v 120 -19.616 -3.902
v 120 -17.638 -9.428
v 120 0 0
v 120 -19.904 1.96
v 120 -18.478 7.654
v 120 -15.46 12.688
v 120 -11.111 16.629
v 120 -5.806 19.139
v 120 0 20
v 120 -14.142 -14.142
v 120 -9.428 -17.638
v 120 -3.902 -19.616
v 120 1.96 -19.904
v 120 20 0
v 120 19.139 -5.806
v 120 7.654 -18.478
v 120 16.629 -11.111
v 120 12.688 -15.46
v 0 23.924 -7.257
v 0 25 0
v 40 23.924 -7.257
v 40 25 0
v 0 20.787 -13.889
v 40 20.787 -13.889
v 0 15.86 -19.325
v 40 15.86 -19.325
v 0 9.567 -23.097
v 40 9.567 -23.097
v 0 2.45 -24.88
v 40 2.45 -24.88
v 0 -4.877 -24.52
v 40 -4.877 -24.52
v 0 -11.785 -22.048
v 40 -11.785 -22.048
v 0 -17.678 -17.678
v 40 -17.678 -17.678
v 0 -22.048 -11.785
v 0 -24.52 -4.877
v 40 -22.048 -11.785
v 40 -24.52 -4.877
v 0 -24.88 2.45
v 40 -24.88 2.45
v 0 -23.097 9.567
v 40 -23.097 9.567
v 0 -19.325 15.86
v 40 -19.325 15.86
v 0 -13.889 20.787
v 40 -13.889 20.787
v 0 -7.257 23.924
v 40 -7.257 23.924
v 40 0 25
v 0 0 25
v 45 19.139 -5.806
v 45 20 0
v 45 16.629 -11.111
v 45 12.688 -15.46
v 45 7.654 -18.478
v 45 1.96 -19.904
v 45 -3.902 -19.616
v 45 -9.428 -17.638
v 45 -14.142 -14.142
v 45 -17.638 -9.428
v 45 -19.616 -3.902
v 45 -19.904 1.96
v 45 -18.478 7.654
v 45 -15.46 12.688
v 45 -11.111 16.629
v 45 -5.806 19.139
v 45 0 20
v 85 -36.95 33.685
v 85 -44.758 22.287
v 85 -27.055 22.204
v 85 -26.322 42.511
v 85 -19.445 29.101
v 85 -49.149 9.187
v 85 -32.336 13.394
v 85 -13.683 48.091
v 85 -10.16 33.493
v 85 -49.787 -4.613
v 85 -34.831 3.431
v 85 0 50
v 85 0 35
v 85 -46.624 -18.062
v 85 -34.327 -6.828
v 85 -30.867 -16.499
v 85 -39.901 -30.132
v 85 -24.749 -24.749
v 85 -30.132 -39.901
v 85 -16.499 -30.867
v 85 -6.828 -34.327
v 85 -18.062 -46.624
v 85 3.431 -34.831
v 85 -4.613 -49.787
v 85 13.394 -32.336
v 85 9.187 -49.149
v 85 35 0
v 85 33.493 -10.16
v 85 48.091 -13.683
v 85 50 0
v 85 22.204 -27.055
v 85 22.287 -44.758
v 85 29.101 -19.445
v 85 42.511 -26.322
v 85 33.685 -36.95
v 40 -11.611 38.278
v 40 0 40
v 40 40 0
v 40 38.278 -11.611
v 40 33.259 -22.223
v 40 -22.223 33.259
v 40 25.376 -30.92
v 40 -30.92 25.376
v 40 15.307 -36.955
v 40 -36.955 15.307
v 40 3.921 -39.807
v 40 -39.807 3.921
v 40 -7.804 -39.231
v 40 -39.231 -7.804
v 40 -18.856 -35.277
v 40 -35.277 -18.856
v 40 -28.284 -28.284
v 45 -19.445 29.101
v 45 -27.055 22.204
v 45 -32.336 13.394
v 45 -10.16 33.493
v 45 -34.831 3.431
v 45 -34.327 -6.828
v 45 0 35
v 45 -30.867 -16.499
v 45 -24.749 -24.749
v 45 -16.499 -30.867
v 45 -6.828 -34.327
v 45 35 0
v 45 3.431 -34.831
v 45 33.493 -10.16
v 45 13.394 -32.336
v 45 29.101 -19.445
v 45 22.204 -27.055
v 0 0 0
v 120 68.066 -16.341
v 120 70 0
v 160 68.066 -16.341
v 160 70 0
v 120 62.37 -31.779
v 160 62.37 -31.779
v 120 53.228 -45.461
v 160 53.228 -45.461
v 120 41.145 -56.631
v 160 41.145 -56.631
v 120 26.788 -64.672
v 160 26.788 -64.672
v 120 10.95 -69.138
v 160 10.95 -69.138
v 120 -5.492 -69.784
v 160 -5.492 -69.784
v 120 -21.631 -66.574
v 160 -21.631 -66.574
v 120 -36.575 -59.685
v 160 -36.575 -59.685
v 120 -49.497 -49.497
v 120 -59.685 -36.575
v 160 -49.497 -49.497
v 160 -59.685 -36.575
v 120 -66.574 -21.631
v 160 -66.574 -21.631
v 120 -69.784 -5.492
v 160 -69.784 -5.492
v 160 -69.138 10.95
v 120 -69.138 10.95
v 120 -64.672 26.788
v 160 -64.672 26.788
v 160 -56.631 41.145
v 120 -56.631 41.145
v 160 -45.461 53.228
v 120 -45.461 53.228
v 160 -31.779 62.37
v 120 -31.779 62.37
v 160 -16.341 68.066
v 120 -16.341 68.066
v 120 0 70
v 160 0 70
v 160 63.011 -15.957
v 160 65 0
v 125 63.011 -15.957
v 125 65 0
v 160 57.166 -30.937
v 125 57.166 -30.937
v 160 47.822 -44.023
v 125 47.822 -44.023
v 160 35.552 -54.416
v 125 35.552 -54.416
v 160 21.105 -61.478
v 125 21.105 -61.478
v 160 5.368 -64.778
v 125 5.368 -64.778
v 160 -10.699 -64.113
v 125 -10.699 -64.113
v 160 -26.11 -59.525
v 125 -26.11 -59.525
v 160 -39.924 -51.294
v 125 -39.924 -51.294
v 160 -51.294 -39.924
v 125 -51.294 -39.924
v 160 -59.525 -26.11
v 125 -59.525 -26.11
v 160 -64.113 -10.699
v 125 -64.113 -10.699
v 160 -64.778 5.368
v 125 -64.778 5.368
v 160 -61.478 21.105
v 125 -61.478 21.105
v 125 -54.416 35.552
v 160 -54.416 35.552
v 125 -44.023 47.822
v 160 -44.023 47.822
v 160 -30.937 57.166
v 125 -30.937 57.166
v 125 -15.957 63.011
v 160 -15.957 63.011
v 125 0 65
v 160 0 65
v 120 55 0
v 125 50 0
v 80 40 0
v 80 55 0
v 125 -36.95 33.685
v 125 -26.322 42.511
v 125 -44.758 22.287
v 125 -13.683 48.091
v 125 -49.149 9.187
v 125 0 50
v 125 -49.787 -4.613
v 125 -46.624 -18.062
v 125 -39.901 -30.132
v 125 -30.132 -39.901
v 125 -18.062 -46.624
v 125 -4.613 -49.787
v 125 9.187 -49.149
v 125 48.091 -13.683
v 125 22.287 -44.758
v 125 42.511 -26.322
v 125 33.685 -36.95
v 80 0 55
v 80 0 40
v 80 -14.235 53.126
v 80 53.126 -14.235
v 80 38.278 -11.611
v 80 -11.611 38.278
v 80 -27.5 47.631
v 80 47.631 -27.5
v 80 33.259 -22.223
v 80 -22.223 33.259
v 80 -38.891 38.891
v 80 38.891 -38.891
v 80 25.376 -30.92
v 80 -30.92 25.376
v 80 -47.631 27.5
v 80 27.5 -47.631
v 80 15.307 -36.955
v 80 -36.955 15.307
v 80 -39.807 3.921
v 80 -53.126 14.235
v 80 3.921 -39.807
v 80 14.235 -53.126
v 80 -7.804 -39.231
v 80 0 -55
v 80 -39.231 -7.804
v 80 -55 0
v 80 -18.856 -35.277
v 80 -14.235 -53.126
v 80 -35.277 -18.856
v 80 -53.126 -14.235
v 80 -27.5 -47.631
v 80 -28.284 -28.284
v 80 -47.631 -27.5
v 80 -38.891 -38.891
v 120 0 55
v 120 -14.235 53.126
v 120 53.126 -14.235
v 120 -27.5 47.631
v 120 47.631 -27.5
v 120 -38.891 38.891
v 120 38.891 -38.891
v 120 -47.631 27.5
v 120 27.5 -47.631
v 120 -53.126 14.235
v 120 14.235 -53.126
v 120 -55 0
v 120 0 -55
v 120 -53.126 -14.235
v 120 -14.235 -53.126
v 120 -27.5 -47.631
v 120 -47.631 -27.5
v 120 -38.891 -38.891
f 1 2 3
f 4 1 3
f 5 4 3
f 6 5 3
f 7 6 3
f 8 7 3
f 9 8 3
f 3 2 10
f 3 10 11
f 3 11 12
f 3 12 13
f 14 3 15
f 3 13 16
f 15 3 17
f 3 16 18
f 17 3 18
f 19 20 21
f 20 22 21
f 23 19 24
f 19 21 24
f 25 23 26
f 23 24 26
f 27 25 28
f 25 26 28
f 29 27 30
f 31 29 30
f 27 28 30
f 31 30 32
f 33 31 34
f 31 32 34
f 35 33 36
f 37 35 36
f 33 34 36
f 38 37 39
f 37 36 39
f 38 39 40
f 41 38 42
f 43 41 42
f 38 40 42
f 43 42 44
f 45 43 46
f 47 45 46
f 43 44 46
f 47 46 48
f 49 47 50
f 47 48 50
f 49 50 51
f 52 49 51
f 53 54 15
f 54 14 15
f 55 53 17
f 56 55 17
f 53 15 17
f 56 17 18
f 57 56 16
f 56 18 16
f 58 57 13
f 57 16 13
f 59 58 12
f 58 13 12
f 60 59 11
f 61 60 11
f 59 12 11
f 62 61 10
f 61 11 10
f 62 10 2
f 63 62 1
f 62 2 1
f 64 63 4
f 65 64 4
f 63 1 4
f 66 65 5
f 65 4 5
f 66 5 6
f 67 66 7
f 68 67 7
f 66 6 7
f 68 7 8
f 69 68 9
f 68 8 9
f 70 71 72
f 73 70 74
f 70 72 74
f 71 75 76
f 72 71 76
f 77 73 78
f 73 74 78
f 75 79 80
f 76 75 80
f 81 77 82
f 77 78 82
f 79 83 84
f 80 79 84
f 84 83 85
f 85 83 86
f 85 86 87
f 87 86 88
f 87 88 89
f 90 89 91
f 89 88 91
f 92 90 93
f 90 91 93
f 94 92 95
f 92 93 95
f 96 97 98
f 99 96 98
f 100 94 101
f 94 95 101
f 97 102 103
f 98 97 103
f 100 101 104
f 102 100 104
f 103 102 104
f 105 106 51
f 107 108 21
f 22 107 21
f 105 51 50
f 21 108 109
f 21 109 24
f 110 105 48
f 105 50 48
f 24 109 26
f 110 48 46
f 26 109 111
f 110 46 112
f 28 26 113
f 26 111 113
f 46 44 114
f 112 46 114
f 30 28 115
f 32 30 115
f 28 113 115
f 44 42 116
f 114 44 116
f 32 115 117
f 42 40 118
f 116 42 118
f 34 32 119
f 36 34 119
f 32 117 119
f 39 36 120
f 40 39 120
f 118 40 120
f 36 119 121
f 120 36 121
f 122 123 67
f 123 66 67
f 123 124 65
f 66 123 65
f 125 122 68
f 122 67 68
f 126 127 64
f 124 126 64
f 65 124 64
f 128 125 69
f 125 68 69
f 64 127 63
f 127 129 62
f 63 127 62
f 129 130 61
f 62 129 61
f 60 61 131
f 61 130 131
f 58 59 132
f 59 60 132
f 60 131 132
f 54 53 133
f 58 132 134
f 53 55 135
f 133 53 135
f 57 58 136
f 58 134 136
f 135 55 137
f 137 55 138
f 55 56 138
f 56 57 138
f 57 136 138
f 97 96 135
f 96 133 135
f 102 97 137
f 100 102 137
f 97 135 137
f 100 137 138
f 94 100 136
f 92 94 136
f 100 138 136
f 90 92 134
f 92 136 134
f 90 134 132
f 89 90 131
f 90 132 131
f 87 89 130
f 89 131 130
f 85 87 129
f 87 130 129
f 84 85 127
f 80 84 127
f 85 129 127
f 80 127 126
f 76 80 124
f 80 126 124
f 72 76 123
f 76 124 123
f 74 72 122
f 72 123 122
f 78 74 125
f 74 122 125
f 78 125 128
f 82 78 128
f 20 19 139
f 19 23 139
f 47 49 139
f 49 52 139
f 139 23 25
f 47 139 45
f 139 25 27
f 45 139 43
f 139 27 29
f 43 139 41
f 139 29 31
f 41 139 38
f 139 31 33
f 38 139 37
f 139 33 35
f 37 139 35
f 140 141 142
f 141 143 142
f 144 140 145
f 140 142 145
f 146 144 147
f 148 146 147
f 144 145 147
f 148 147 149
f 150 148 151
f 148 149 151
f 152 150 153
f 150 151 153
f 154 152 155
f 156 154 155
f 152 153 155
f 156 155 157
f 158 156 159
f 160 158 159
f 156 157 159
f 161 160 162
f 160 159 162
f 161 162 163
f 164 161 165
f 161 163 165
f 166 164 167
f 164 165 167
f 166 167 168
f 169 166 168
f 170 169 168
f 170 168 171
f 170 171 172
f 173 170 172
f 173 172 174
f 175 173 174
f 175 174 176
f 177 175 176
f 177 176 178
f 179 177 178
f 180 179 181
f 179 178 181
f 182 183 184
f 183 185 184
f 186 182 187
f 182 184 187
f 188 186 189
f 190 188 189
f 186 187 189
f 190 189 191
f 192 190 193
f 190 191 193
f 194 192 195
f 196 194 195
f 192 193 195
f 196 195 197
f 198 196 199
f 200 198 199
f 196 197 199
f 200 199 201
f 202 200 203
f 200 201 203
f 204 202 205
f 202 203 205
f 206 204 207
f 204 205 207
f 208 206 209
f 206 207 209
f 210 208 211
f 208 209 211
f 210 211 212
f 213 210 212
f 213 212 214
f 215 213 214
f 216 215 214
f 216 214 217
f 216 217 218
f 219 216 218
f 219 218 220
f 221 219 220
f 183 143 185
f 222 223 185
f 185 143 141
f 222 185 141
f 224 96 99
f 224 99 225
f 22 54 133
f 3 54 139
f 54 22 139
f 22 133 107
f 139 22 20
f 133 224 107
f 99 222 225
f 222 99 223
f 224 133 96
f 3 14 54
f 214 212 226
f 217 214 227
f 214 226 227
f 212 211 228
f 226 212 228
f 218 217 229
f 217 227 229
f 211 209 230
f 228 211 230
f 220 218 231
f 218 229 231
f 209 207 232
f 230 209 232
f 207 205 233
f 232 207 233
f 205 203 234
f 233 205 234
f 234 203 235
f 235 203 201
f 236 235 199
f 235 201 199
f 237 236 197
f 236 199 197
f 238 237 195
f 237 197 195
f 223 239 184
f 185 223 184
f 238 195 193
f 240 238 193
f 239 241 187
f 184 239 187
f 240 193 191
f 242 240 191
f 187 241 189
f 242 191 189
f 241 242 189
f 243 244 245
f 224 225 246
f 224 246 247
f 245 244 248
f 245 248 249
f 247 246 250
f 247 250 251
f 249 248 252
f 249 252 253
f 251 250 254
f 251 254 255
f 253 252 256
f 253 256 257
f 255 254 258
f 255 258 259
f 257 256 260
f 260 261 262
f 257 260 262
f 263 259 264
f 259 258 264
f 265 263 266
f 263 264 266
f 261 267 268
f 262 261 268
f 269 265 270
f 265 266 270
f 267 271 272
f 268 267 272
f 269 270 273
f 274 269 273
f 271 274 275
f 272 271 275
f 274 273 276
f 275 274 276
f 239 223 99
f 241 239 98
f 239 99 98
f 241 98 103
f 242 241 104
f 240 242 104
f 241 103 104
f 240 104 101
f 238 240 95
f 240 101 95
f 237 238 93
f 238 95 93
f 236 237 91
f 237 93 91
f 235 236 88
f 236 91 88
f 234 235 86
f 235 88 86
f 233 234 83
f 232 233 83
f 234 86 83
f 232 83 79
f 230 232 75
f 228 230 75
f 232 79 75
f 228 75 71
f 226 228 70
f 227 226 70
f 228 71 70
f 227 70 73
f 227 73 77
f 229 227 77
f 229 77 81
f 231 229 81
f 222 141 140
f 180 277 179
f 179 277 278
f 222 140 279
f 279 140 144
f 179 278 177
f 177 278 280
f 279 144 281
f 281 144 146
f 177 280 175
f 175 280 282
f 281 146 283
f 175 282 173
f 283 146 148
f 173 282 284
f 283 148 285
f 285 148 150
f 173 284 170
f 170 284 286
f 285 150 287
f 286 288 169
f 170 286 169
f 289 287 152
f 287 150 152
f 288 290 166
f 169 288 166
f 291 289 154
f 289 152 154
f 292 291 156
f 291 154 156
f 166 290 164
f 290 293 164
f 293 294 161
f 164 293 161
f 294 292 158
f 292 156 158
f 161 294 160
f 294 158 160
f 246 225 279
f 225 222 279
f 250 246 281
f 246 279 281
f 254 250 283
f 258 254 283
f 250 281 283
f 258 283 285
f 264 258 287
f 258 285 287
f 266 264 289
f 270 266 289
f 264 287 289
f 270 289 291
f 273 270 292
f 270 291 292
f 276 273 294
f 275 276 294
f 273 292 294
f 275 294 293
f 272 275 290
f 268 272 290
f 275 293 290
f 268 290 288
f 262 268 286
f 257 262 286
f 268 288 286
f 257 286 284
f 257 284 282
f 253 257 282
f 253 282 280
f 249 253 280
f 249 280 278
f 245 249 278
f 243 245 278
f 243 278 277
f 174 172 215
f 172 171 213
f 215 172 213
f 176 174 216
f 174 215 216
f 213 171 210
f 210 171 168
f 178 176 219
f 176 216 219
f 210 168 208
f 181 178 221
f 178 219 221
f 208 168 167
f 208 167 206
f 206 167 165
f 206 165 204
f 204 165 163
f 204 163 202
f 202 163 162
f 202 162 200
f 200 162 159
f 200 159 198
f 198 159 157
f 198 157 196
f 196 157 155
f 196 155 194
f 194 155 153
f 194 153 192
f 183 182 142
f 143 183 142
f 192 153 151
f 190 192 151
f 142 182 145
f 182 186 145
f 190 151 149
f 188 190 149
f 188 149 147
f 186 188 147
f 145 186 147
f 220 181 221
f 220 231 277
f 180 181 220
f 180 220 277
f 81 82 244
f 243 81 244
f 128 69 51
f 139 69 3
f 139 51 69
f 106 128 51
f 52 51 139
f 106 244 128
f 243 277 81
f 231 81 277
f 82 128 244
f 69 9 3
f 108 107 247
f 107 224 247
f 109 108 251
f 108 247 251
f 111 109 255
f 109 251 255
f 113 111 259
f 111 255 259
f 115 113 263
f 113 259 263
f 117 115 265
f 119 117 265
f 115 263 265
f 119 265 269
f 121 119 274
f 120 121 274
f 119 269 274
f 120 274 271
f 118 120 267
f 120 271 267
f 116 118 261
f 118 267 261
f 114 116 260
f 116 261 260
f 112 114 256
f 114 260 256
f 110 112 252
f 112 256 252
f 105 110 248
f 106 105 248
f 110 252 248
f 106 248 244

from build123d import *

# Parameters (mm, degrees)
REVOLVE1_ANGLE = 270


with BuildPart() as part:
    # Sketch1 → Revolve1 (revolve)
    with BuildSketch(Plane.XY):
        Polygon((120, 0), (0, 0), (0, 25), (40, 25), (40, 40), (80, 40), (80, 55), (120, 55), (120, 70), (160, 70), (160, 65), (125, 65), (125, 50), (85, 50), (85, 35), (45, 35), (45, 20), (120, 20), align=None)
    revolve(axis=Axis((120, 0, 0), (-1, 0, 0)), revolution_arc=REVOLVE1_ANGLE)


solid = part.part
